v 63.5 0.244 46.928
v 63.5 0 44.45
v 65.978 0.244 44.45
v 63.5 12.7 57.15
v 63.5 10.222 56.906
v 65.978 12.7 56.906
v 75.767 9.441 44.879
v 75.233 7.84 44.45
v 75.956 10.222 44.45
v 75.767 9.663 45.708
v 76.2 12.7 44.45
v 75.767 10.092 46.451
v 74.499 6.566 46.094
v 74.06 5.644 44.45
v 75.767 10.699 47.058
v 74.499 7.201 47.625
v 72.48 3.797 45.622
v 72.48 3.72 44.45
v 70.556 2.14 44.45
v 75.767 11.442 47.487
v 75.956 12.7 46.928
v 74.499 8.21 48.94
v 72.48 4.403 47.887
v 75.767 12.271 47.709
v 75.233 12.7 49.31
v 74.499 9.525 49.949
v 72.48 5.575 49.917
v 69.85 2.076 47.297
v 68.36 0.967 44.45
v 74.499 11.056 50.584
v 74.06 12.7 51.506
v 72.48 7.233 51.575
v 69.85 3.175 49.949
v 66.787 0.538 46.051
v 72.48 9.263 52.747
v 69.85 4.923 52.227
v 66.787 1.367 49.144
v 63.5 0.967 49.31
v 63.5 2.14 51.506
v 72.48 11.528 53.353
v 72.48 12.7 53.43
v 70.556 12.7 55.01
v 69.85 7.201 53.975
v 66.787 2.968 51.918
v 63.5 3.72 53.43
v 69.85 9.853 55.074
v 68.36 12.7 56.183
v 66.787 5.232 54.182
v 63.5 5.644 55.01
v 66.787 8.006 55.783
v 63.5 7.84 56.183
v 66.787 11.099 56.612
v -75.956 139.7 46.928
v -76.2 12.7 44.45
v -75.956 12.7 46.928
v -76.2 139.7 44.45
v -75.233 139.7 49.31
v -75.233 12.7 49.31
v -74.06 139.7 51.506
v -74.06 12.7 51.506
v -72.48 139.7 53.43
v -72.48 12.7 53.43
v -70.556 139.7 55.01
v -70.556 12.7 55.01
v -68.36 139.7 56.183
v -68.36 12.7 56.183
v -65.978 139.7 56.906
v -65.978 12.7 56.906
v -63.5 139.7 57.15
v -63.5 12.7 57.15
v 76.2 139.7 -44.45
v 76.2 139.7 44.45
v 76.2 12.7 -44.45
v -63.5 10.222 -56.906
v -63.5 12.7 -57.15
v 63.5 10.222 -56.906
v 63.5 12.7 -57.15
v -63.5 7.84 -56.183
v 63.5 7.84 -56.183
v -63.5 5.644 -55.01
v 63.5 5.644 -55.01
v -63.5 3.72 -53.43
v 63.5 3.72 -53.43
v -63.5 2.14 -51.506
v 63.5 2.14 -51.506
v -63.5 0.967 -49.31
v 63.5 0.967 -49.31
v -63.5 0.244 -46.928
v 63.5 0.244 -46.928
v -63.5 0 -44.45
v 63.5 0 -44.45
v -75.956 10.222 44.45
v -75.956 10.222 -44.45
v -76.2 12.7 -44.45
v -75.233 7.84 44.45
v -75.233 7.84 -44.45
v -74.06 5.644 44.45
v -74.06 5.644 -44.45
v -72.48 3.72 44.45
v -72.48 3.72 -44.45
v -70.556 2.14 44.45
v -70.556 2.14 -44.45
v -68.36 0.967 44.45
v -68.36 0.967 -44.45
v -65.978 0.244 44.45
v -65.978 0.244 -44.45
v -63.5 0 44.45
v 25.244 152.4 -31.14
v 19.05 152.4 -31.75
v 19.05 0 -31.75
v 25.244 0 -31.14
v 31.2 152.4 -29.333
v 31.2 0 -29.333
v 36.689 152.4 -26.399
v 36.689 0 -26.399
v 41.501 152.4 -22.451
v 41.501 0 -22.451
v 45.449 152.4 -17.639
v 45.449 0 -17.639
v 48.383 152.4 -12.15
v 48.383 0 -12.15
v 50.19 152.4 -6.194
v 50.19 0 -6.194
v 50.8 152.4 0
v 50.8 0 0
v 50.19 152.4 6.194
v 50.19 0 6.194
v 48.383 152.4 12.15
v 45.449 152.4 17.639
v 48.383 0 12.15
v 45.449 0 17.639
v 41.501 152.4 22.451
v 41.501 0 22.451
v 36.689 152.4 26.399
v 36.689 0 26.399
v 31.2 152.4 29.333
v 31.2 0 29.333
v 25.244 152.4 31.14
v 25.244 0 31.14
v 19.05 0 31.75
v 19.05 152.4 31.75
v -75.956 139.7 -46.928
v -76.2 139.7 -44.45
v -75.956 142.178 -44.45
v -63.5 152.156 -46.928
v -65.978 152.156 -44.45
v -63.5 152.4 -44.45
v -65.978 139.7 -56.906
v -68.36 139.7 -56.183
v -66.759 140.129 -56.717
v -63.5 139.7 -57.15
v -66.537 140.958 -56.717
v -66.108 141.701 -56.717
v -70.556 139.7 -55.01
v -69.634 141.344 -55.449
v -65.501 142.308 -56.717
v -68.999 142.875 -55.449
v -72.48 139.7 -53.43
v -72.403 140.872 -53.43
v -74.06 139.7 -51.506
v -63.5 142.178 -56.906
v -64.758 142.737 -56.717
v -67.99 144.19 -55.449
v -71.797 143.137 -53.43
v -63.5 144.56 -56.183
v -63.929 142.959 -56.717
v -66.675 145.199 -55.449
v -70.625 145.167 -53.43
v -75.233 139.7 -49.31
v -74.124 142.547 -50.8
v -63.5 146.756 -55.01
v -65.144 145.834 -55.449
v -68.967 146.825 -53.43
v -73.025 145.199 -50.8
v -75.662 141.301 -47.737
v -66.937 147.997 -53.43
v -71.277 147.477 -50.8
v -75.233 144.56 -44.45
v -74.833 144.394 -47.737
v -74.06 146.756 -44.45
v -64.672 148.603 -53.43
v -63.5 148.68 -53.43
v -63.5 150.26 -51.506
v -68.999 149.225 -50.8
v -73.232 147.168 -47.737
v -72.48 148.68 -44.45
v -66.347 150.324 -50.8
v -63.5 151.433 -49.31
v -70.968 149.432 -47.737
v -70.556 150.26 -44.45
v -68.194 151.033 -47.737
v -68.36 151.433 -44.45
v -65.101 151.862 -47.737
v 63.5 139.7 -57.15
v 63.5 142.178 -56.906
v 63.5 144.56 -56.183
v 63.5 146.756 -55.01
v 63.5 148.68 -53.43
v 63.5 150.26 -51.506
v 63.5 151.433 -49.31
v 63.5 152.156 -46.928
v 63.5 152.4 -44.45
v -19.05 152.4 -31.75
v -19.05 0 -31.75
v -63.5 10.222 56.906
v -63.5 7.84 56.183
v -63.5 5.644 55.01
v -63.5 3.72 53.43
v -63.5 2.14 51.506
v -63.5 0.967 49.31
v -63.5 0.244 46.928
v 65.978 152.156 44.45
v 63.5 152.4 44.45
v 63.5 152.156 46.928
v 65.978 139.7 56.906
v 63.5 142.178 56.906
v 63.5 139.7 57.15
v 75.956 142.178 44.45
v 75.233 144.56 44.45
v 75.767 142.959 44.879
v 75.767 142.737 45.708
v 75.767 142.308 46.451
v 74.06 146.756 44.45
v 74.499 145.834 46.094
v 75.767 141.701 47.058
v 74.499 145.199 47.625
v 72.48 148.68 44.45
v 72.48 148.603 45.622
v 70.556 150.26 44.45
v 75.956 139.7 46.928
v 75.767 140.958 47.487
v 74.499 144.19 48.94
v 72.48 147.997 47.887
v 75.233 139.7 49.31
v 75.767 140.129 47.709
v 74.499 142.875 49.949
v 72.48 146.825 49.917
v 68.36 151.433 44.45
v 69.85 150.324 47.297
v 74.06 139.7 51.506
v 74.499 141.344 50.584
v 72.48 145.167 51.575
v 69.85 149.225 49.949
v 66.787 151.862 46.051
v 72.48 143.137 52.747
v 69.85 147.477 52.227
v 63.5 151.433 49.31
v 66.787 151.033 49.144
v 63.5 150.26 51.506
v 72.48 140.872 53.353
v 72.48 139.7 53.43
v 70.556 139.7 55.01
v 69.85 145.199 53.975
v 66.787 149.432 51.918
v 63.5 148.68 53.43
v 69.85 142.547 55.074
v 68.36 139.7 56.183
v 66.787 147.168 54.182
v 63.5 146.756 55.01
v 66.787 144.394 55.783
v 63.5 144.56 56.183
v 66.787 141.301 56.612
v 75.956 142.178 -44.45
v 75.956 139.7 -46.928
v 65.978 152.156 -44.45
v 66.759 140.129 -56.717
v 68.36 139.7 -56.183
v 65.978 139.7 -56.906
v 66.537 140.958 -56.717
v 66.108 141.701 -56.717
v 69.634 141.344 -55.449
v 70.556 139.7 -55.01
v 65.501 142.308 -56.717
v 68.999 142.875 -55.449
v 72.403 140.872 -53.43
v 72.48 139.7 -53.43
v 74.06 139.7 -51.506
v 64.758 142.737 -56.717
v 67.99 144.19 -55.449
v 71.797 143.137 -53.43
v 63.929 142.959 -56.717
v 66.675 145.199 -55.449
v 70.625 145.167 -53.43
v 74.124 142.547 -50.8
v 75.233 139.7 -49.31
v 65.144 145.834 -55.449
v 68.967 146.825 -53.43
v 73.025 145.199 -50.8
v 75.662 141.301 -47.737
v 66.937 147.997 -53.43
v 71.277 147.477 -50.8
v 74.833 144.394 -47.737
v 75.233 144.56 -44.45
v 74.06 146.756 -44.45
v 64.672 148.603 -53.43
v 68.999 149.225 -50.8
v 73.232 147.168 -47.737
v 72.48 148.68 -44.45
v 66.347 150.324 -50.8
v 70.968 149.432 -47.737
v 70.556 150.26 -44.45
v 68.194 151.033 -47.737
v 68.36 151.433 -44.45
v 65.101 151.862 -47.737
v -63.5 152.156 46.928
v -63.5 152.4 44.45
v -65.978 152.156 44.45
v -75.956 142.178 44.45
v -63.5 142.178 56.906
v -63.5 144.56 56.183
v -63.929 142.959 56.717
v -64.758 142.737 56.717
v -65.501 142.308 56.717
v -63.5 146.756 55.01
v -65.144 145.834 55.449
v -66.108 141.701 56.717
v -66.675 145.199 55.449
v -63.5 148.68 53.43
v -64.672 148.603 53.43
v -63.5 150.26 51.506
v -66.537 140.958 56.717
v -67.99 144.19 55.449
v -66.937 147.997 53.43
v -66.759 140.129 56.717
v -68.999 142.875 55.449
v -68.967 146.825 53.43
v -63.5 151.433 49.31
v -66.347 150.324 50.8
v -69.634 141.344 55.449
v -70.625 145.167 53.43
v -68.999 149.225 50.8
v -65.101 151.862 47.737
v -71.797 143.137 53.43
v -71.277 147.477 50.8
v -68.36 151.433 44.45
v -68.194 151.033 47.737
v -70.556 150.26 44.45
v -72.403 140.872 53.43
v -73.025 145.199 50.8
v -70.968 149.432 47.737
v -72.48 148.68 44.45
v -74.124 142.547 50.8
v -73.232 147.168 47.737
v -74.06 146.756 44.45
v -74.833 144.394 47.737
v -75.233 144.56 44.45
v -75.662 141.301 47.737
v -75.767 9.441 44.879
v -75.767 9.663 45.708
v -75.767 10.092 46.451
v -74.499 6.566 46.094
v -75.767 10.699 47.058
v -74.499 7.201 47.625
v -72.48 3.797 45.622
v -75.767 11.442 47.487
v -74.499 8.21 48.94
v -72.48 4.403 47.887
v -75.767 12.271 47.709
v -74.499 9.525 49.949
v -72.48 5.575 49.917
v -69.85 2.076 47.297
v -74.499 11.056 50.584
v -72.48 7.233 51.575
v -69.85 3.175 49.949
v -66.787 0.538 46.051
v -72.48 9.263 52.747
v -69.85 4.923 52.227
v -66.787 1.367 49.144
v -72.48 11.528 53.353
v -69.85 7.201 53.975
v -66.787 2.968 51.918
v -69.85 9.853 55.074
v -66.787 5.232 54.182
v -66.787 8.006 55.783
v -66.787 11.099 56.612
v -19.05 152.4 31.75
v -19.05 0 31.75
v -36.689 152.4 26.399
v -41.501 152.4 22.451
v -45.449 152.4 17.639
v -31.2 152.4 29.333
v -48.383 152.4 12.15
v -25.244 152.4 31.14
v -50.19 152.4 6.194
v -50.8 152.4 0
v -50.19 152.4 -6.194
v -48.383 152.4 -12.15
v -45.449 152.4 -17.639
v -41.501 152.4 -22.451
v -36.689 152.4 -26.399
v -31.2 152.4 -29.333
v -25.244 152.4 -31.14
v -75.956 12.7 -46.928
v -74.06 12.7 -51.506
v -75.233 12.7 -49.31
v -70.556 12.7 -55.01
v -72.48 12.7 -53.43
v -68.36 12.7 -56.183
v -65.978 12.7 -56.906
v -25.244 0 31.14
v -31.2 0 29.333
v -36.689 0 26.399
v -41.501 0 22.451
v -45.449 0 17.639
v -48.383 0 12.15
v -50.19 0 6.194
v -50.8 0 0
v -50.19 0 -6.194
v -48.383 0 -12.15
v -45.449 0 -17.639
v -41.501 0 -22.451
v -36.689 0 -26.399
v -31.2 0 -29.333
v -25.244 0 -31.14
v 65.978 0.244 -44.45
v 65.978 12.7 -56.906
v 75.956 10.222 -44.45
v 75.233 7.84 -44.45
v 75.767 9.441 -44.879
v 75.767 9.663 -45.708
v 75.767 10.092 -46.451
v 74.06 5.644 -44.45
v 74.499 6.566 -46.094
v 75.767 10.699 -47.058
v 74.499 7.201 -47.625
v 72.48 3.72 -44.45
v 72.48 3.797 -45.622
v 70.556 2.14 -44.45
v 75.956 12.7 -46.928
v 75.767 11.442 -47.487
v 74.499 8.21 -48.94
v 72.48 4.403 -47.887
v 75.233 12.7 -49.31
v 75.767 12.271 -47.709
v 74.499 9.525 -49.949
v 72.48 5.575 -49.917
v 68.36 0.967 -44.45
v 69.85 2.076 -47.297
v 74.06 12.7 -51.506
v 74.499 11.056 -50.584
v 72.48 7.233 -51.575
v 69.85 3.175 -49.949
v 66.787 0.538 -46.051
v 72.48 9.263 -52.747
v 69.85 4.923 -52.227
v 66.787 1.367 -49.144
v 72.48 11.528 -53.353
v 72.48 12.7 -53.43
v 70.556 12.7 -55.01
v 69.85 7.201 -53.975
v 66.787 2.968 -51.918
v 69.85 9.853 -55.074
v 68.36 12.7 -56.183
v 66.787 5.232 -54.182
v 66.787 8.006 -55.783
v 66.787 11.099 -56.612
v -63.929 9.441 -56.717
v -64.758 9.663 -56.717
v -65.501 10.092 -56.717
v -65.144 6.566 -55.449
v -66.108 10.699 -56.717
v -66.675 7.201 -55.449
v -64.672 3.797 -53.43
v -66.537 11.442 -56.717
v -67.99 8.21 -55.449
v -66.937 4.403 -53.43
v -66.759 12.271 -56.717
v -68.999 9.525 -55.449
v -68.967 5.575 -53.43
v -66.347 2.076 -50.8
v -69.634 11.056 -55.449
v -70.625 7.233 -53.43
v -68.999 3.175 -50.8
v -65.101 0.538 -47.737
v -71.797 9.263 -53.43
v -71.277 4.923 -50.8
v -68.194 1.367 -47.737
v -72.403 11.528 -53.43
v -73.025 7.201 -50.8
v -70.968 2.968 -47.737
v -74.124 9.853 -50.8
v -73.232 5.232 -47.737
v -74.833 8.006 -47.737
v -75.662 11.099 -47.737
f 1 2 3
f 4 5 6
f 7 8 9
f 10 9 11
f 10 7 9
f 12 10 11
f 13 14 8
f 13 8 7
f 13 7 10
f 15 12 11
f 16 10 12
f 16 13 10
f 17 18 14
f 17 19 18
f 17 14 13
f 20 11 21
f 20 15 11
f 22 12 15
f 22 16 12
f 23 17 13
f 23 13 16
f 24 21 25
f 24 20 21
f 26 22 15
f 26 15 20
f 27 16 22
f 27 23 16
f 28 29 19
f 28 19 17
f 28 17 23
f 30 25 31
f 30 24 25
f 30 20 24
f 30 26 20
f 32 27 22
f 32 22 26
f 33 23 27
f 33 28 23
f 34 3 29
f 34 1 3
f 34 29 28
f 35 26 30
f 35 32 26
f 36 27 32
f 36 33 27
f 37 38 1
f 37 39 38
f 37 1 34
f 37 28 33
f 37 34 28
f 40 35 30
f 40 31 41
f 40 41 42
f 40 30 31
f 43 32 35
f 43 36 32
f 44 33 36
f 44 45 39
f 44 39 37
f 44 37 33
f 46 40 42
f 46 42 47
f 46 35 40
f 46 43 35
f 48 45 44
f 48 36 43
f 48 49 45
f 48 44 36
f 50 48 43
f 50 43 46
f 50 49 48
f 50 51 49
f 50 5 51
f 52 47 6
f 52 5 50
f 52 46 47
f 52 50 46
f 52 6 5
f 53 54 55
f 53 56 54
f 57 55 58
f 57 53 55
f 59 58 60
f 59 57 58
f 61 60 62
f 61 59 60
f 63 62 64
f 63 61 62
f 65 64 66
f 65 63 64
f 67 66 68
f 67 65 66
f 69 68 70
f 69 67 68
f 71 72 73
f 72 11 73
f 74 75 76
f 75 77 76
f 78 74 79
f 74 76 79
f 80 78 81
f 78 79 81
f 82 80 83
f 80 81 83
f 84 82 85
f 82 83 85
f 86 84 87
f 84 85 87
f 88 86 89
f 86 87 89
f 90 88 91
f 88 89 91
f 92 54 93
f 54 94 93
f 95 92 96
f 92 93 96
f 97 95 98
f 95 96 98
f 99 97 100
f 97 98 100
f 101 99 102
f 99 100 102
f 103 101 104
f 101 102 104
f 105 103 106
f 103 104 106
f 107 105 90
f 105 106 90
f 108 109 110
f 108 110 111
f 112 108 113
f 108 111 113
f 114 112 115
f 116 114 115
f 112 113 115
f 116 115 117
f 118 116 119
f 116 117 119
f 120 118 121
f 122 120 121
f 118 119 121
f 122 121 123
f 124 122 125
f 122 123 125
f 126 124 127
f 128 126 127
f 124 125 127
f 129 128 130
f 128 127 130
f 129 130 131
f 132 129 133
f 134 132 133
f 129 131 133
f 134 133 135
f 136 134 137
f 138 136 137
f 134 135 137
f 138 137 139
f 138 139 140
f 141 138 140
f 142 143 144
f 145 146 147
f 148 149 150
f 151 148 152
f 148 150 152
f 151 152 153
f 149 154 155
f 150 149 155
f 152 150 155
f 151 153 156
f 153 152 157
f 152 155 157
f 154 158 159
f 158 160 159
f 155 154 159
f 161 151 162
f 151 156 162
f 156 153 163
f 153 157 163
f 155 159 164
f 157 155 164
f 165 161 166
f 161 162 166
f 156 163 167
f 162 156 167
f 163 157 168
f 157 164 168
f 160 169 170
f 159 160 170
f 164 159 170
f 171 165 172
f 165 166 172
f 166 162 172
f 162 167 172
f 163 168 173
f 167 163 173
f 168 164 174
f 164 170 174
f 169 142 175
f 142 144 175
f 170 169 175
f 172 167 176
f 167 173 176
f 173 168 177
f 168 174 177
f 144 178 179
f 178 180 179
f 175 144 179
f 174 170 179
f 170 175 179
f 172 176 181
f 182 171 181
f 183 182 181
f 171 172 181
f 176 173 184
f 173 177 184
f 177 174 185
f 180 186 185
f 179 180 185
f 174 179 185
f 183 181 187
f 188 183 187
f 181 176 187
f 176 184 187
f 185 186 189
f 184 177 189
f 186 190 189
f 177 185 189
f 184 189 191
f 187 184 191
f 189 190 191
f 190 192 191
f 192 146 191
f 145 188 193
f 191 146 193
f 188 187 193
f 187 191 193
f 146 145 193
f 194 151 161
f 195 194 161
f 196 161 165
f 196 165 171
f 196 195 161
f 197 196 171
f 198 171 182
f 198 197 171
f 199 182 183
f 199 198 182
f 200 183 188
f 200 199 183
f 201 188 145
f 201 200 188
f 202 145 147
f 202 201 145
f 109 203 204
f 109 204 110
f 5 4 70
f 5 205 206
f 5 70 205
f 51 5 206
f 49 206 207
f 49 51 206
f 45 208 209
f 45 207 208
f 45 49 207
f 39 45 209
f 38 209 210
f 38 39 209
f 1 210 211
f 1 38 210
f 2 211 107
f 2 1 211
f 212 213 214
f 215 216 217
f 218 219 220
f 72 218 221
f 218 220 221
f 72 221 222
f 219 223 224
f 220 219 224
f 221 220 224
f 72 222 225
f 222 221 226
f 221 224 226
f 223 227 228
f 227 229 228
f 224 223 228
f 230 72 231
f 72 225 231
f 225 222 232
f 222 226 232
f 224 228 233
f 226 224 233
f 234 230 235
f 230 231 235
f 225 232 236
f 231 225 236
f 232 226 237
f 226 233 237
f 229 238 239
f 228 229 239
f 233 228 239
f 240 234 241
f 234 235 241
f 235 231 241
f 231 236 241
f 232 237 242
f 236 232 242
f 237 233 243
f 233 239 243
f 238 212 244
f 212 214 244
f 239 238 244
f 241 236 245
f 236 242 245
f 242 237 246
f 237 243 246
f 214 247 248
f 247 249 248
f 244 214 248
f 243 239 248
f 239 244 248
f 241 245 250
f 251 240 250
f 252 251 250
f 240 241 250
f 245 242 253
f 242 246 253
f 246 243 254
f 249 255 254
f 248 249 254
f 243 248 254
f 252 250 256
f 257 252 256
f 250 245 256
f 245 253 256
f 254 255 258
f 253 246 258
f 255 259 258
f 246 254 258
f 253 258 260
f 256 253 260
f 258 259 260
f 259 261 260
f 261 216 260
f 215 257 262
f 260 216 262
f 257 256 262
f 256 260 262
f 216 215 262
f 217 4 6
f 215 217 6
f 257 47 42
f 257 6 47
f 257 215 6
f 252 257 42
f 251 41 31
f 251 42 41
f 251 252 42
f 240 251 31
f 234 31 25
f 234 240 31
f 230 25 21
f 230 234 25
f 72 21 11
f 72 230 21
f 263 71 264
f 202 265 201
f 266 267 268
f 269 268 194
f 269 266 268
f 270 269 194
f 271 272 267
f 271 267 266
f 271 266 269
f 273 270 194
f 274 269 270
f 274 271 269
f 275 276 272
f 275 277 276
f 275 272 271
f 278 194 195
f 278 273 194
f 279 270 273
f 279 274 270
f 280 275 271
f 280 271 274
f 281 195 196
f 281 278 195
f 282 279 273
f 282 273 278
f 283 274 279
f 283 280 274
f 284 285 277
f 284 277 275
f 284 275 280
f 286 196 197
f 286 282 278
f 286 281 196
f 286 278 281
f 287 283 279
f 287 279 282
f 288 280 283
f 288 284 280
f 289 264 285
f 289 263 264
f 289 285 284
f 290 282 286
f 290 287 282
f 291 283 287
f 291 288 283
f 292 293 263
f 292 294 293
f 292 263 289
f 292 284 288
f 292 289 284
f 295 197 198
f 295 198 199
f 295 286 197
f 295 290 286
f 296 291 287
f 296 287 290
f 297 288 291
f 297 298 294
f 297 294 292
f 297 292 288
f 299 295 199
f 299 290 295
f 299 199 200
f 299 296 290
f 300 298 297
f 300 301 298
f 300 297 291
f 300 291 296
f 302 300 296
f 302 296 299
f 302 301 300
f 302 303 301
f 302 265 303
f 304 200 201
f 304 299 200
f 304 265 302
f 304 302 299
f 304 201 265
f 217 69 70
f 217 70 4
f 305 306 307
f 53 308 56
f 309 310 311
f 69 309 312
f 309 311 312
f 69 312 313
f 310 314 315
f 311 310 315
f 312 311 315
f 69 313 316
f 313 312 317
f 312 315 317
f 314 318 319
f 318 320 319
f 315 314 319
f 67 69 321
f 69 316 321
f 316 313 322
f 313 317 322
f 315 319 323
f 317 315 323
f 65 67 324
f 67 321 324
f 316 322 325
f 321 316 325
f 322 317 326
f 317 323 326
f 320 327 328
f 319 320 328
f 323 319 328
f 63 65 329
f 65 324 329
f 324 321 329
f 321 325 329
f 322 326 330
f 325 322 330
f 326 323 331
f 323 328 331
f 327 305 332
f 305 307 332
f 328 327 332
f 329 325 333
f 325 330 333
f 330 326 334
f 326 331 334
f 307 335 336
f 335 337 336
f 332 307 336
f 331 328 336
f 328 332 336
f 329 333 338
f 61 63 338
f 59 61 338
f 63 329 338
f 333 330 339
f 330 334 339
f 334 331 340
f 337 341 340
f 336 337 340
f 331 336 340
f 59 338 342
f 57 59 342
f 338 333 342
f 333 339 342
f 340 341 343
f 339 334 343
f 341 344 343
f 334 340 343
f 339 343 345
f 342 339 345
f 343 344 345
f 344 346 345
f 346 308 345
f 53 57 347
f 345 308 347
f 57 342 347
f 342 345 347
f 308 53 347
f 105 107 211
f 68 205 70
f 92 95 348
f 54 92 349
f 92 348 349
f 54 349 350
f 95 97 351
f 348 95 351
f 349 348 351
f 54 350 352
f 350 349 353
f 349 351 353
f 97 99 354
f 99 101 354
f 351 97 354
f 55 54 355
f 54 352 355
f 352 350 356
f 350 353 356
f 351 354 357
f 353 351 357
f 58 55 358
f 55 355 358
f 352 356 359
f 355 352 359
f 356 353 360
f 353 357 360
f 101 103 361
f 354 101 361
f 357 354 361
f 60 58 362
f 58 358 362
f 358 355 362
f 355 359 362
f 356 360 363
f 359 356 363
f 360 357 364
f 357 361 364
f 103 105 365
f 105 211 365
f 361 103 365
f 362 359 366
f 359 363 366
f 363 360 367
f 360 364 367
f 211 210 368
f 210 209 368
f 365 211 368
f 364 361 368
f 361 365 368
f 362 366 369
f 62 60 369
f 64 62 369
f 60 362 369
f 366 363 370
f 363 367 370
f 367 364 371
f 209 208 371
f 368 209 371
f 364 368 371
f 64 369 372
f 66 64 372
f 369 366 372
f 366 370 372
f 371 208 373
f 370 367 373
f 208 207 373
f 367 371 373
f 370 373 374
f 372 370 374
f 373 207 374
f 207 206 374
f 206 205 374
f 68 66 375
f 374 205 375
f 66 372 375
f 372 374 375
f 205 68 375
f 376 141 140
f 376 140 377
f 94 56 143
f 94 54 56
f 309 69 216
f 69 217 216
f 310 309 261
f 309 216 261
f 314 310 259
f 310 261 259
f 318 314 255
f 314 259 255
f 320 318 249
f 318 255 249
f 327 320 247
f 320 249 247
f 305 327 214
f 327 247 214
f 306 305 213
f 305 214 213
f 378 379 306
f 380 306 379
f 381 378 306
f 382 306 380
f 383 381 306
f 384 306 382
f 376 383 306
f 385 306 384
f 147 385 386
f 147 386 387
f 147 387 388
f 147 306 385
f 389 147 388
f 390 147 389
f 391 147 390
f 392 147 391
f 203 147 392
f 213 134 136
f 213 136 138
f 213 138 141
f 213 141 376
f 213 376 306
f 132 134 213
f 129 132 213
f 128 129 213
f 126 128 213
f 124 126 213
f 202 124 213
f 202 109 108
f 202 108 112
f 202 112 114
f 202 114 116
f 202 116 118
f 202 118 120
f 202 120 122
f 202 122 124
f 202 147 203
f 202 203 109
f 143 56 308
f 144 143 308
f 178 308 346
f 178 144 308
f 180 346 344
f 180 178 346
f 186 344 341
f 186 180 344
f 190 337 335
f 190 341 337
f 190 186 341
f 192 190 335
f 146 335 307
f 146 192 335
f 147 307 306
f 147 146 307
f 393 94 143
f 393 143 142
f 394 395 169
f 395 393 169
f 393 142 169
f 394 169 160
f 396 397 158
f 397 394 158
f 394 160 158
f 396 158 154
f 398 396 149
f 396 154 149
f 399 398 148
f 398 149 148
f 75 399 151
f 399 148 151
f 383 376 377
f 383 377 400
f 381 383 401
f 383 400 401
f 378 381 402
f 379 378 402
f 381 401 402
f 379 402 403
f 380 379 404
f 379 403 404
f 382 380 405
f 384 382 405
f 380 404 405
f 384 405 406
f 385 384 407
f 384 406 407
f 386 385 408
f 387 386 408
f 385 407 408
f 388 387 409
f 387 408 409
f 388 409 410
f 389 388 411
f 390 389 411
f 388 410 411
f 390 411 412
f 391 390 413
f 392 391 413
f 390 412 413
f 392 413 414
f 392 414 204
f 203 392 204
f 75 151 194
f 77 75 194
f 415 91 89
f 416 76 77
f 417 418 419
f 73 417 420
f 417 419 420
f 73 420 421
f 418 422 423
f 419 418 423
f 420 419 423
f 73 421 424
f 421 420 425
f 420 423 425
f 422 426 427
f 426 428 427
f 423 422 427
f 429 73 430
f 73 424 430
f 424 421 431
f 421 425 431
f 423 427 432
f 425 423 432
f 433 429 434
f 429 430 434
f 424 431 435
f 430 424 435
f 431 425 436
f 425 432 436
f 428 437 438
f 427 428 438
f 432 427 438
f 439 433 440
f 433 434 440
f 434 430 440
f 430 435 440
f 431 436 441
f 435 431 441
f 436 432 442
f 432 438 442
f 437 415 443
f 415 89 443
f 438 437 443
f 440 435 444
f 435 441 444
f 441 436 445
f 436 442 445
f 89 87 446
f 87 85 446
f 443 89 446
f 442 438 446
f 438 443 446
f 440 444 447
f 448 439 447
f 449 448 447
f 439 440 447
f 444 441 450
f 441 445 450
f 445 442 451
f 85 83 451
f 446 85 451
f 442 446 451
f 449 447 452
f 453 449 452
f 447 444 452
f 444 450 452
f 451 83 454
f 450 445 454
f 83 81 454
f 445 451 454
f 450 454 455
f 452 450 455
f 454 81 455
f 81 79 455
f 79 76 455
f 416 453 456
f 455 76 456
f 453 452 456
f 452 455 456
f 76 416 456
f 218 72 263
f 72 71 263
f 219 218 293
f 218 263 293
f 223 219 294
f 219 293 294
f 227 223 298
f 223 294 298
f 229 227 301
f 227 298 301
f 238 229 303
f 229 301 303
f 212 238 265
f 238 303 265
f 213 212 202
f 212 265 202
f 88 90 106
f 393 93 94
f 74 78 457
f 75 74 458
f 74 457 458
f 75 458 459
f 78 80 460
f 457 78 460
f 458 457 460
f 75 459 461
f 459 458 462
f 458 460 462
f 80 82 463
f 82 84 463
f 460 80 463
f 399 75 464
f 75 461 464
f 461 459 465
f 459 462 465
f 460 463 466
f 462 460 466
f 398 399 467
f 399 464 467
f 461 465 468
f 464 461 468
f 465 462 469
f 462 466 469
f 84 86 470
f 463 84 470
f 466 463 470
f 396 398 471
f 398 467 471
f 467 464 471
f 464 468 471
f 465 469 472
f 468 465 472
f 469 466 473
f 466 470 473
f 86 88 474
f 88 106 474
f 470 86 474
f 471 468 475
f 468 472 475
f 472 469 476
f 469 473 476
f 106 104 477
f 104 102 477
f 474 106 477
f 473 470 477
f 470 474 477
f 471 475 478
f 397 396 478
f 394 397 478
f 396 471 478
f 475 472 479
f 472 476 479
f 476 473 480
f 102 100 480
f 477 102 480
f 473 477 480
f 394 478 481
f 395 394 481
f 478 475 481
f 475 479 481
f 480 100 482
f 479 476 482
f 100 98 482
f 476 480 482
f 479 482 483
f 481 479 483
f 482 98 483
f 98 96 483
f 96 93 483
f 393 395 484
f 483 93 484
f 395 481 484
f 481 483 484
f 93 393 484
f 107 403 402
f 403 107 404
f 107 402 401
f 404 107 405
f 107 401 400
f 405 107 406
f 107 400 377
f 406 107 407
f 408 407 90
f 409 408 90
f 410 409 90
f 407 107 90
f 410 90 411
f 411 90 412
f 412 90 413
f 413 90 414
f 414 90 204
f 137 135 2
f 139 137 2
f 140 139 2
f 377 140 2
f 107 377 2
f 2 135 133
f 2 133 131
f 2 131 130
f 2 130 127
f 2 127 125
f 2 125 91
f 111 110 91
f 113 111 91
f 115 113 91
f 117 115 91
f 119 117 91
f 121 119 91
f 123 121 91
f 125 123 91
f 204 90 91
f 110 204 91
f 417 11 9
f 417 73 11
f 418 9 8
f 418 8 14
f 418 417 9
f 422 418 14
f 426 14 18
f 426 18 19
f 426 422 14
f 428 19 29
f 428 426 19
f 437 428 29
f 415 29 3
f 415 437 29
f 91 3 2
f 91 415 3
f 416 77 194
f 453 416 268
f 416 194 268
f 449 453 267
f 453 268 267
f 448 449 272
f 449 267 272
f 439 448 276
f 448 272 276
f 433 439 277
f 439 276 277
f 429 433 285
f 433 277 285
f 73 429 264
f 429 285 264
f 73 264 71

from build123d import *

# Parameters (mm, degrees)
SKETCH1_W           = 152.4
SKETCH1_H           = 114.3
BOSS_EXTRUDE1_DEPTH = 152.4
FILLET1_R           = 12.7


with BuildPart() as part:
    # Sketch1 → Boss-Extrude1 (new body)
    with BuildSketch(Plane(origin=(0, 0, 0), x_dir=(1, 0, 0), z_dir=(0, 1, 0))):
        Rectangle(SKETCH1_W, SKETCH1_H)
        with BuildLine():
            Line((-19.05, 31.75), (19.05, 31.75))
            ThreePointArc((19.05, 31.75), (50.8, 0), (19.05, -31.75))
            Line((19.05, -31.75), (-19.05, -31.75))
            ThreePointArc((-19.05, -31.75), (-50.8, 0), (-19.05, 31.75))
        make_face(mode=Mode.SUBTRACT)
    extrude(amount=BOSS_EXTRUDE1_DEPTH)

    # Fillet1
    fillet1_edges = [part.edges().sort_by_distance(p)[0] for p in [
        (-76.2, 152.4, 0),
        (0, 152.4, 57.15),
        (76.2, 152.4, 0),
        (0, 0, 57.15),
        (-76.2, 0, 0),
        (0, 0, -57.15),
        (76.2, 0, 0),
        (76.2, 76.2, 57.15),
        (-76.2, 76.2, 57.15),
        (-76.2, 76.2, -57.15),
        (76.2, 76.2, -57.15),
        (0, 152.4, -57.15),
    ]]
    fillet(fillet1_edges, radius=FILLET1_R)


solid = part.part
